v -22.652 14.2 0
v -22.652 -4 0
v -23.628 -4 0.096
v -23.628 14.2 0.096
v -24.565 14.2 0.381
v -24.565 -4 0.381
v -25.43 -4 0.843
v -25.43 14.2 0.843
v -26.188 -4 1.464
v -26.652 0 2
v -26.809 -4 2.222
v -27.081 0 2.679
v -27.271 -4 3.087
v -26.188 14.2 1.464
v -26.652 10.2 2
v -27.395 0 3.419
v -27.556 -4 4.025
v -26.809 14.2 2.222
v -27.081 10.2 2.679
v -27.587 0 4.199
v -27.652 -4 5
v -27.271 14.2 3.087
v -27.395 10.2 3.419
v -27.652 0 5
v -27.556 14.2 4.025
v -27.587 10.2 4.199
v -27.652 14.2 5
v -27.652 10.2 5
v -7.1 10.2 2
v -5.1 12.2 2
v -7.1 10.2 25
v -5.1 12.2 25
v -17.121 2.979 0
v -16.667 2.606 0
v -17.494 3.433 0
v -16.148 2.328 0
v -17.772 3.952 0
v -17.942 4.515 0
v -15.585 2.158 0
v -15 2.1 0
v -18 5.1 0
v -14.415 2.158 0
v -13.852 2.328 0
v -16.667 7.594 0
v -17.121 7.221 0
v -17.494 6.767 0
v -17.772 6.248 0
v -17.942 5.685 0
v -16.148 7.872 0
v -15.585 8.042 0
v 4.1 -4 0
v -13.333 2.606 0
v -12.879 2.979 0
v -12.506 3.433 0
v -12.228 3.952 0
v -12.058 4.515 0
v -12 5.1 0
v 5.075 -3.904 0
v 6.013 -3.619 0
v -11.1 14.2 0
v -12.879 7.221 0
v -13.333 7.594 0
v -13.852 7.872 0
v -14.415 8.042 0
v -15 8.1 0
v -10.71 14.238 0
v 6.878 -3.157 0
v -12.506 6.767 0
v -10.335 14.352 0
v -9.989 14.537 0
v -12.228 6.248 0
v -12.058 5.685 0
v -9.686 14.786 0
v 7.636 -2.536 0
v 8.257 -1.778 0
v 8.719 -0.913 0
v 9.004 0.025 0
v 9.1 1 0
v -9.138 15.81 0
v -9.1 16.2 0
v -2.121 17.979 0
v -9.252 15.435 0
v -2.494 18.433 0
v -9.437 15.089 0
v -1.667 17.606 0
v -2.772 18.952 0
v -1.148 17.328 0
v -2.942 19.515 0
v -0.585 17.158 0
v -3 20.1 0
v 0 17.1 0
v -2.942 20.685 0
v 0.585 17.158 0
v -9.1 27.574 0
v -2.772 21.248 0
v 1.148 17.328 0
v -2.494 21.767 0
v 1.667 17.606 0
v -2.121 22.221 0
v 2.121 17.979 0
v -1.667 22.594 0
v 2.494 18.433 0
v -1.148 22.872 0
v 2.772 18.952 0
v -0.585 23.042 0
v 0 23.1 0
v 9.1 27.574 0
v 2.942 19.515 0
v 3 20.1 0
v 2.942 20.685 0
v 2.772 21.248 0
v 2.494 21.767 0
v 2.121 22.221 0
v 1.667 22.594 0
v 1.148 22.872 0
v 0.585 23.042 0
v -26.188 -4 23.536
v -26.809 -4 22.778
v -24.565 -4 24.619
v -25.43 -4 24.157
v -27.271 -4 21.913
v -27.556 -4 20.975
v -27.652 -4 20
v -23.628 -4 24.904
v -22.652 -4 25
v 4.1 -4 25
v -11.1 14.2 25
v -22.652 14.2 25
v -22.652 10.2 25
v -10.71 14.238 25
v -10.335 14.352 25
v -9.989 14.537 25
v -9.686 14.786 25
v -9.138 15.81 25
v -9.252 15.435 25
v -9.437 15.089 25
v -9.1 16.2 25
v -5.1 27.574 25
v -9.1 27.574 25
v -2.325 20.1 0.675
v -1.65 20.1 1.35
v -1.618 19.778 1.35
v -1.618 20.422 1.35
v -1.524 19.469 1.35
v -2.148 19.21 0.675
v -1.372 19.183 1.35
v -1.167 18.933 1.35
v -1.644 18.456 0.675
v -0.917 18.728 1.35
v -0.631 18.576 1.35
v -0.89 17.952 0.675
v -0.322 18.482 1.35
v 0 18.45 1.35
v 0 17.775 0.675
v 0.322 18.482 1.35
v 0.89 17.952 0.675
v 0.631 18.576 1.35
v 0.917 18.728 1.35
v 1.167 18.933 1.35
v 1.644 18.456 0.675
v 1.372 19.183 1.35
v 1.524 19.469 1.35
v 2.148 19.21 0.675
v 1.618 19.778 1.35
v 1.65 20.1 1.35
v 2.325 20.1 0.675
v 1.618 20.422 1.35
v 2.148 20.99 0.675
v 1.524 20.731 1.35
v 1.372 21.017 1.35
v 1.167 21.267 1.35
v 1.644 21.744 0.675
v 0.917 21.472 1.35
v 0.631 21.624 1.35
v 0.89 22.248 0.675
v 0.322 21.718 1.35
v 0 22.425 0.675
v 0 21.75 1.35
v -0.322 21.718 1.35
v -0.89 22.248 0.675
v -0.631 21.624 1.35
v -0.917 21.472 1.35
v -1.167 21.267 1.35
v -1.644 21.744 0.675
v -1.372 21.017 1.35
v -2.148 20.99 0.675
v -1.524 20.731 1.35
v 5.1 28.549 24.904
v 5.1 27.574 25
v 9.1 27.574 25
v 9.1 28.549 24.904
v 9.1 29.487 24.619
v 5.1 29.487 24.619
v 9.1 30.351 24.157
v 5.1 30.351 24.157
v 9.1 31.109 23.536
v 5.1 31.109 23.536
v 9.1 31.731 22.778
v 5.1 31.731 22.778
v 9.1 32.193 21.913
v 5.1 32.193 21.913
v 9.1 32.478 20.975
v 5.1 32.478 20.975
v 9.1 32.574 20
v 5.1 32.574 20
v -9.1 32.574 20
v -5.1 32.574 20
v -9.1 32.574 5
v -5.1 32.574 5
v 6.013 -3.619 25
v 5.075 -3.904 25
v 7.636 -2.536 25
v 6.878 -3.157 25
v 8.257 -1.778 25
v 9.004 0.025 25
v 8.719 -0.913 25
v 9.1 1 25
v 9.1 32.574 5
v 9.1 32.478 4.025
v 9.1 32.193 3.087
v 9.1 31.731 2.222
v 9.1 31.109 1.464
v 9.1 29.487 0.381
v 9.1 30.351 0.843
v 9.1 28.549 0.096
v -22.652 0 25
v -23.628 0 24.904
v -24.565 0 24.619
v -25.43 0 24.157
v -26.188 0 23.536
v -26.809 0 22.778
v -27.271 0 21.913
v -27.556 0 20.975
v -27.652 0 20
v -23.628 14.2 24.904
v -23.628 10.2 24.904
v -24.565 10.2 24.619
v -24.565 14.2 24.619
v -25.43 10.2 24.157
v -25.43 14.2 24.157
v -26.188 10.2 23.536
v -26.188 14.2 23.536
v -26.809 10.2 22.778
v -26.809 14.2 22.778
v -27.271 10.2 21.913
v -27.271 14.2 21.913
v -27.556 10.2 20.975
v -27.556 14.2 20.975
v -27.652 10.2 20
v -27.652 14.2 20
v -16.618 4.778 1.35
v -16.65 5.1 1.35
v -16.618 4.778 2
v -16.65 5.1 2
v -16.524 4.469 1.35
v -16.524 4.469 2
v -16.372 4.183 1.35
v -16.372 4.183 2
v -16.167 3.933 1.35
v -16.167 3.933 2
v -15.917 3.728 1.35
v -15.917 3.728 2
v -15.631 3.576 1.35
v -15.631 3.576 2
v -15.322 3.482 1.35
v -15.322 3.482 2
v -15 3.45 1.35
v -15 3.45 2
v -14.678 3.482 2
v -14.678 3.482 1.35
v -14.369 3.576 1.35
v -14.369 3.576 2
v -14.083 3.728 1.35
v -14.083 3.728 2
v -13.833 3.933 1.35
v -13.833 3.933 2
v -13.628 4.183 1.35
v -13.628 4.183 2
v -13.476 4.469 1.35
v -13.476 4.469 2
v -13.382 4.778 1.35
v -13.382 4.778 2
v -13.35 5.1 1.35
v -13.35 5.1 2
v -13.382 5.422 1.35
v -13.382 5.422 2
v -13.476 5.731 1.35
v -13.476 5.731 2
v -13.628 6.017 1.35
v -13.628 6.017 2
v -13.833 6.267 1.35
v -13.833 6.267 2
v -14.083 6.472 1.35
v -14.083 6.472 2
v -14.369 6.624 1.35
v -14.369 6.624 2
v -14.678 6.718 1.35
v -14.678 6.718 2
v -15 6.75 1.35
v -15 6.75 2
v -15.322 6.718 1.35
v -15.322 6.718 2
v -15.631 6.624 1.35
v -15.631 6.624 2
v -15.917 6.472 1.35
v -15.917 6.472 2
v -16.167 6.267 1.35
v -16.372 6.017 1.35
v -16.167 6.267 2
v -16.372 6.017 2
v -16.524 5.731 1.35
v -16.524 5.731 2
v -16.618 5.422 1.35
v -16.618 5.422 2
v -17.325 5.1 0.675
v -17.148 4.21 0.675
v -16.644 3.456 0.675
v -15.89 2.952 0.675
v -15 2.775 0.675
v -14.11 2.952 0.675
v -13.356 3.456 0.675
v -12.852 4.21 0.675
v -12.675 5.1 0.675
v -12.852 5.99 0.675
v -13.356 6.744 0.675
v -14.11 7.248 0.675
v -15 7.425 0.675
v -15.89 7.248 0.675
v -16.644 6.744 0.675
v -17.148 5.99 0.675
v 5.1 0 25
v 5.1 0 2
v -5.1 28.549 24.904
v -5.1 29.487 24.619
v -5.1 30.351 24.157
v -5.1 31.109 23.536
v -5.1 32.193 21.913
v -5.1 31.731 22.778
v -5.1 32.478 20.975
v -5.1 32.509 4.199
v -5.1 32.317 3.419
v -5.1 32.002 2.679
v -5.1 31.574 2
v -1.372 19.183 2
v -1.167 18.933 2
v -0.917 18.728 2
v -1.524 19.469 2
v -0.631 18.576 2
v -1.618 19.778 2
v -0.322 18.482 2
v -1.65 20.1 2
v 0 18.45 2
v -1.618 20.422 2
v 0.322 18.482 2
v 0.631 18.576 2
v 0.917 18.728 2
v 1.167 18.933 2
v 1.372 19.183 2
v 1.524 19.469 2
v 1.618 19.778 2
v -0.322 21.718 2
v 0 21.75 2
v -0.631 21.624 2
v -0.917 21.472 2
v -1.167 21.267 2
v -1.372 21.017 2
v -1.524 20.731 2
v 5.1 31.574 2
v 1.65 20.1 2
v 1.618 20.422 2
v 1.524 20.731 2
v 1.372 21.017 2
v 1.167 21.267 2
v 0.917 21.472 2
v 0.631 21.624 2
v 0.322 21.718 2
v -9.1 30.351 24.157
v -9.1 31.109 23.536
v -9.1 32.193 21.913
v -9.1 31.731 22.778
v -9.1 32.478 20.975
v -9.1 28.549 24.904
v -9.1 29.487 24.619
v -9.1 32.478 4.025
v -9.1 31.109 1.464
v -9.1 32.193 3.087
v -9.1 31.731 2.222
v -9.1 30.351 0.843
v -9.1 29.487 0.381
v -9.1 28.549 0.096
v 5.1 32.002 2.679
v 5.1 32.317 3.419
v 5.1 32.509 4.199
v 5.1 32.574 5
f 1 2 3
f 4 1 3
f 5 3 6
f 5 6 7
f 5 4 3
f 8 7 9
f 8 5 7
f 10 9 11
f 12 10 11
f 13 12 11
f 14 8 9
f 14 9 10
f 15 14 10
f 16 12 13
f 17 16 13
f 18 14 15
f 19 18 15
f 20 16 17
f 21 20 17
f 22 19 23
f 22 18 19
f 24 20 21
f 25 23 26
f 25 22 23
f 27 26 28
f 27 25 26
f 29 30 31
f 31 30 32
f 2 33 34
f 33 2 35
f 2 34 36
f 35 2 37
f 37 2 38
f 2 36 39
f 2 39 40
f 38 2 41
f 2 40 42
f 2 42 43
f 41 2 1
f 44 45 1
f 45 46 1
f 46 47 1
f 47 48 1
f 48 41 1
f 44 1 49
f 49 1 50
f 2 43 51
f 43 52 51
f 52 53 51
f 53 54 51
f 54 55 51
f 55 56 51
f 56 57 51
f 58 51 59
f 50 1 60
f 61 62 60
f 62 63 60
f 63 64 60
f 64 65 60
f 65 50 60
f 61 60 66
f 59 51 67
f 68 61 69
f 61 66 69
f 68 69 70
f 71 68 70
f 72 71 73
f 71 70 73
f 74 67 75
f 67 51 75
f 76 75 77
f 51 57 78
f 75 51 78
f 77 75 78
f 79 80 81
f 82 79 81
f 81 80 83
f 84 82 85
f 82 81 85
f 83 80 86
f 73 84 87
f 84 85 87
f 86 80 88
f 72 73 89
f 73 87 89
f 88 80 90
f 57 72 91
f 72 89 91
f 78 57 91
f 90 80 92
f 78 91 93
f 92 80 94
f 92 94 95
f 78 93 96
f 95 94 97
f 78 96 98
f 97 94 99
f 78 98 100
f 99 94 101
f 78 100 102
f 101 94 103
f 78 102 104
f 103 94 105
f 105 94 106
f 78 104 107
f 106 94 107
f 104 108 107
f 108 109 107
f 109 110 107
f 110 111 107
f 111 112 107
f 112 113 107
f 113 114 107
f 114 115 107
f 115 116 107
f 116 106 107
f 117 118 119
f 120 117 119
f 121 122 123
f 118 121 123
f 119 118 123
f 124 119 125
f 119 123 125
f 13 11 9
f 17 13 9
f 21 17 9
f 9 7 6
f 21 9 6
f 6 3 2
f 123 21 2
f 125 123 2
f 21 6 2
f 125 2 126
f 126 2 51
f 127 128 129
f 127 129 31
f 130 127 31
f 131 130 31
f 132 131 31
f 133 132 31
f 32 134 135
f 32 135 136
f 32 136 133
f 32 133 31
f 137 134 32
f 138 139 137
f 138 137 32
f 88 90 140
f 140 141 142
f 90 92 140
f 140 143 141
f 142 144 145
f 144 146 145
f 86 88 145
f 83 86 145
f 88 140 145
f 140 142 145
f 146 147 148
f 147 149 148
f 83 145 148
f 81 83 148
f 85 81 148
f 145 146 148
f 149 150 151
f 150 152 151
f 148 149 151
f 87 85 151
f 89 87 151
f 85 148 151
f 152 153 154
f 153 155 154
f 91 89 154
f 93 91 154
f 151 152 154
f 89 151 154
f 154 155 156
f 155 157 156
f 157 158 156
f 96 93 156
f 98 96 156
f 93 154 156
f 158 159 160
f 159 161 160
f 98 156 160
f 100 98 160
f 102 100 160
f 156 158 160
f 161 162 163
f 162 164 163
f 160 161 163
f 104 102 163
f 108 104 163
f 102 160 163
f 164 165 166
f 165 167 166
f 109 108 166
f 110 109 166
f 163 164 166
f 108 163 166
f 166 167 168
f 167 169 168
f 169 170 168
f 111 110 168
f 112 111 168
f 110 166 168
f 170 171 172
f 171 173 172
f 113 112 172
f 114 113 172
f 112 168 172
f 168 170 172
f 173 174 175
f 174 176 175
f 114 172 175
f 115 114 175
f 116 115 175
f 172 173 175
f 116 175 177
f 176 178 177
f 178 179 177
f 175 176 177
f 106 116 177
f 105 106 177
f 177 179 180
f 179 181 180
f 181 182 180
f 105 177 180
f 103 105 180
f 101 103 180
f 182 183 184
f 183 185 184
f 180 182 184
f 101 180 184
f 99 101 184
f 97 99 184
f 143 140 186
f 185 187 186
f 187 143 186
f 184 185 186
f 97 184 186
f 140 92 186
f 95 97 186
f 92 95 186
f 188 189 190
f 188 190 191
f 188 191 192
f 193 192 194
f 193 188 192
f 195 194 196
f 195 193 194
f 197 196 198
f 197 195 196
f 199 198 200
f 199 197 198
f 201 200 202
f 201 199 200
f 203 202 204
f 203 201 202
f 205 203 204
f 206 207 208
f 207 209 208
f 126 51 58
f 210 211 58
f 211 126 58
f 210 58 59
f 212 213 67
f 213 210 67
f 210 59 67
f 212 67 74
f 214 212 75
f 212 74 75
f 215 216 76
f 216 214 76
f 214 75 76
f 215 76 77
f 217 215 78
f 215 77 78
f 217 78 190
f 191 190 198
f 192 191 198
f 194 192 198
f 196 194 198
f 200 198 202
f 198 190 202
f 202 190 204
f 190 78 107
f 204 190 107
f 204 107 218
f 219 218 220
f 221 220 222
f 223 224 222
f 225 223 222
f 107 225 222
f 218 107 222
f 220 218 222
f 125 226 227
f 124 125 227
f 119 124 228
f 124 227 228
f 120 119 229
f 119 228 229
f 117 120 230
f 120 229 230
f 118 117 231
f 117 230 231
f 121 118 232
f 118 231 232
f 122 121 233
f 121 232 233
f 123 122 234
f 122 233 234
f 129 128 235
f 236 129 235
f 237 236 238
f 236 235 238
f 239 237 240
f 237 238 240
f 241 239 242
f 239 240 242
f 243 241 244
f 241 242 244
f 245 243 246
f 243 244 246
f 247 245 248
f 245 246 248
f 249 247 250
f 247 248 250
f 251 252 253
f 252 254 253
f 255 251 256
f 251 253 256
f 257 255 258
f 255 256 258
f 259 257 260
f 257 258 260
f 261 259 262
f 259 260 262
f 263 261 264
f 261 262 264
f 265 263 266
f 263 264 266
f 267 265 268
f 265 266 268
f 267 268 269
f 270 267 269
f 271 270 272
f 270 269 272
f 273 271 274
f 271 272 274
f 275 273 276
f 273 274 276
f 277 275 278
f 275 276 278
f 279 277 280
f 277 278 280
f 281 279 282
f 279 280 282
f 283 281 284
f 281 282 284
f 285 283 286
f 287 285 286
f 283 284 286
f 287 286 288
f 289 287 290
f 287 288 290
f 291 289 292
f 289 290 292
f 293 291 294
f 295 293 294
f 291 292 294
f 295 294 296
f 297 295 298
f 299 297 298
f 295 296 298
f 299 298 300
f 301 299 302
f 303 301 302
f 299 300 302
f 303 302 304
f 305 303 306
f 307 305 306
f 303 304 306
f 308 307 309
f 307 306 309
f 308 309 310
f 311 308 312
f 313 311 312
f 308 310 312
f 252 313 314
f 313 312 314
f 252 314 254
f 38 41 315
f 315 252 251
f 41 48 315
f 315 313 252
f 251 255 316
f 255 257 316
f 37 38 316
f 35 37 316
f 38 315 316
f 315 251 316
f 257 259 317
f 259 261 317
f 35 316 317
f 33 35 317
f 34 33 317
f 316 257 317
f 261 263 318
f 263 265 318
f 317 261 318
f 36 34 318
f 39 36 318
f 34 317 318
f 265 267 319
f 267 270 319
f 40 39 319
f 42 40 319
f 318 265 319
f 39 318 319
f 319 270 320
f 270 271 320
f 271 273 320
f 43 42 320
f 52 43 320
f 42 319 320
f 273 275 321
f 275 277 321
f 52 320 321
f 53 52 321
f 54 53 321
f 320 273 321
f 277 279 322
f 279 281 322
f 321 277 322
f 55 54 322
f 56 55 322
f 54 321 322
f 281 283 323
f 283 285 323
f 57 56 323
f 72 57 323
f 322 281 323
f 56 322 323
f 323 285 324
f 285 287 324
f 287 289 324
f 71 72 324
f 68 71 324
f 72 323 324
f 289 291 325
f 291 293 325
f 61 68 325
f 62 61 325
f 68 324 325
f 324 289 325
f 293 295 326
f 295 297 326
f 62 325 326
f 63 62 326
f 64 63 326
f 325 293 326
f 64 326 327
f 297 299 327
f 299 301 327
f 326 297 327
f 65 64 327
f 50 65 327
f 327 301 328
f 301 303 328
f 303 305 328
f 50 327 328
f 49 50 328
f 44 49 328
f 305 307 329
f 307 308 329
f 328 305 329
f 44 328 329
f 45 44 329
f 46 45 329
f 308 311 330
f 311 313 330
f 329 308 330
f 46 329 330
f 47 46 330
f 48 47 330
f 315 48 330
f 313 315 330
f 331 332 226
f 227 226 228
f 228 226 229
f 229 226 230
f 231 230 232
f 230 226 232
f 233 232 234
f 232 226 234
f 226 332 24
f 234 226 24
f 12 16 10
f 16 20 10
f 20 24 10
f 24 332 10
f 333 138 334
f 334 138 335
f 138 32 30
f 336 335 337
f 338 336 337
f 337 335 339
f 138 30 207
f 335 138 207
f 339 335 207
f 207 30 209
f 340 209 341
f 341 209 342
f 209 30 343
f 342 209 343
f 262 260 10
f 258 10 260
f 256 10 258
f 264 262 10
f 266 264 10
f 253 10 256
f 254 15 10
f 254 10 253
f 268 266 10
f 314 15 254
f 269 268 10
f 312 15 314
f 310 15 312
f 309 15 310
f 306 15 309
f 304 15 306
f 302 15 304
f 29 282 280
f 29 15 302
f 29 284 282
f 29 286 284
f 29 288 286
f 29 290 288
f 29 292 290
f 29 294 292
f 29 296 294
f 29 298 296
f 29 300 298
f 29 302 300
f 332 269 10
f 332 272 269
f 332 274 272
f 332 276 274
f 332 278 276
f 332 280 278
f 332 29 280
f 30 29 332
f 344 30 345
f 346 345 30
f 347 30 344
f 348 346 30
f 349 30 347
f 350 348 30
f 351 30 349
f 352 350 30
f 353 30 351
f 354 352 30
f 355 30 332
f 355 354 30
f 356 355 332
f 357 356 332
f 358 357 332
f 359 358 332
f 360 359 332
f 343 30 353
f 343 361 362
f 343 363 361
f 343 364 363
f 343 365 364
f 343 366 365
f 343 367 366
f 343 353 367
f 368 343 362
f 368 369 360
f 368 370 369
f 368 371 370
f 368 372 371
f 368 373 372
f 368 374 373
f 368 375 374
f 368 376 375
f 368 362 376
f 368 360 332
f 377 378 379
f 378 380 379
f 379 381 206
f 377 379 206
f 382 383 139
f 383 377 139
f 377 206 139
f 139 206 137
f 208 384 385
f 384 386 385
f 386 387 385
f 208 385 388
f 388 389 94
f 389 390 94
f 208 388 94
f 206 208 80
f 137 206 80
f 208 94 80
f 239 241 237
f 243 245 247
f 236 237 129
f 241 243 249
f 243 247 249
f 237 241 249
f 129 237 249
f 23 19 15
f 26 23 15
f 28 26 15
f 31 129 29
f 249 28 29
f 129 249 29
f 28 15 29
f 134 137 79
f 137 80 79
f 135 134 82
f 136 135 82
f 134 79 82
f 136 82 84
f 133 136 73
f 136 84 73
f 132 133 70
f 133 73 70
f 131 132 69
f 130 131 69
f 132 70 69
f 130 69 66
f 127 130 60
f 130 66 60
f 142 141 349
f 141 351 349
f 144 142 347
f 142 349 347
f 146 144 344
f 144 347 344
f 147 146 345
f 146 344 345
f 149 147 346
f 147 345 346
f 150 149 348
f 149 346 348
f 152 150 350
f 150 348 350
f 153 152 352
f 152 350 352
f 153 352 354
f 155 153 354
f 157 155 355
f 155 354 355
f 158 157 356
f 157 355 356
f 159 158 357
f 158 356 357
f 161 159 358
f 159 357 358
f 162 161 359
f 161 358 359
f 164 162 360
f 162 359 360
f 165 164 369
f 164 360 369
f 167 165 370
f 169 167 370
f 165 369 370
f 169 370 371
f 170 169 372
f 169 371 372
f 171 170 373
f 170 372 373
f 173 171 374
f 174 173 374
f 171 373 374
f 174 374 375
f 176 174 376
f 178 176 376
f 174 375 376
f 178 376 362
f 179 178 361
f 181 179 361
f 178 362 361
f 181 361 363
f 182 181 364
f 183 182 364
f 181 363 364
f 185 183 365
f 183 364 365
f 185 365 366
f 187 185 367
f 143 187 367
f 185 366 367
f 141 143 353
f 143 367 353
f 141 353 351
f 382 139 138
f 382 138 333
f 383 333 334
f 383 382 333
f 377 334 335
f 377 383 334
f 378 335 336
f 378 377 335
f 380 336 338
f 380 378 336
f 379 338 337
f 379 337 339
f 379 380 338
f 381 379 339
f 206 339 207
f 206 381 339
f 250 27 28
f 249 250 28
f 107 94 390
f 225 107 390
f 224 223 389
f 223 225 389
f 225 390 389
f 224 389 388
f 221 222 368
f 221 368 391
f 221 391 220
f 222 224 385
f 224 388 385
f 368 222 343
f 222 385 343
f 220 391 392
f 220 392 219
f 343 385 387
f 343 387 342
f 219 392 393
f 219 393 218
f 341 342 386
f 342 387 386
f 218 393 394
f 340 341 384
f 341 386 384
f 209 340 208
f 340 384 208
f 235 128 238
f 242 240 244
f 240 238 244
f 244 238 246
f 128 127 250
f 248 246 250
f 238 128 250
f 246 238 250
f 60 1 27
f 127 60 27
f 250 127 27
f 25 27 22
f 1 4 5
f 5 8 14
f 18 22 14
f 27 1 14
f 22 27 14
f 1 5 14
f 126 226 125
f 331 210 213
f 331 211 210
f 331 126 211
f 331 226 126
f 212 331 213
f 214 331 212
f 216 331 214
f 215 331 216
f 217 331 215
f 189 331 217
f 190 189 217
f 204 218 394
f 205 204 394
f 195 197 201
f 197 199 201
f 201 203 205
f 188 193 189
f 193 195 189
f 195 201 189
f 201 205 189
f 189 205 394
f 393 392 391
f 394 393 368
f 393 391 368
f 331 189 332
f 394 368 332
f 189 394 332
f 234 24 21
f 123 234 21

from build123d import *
from build123d import SkipClean  # not in build123d's __all__

# Parameters (mm, degrees)
F1_DEPTH       = 2
F2_DEPTH       = 25
F3_T1_DEPTH    = 29
F3_T3_DEPTH    = 29
F3_T5_DEPTH    = 29
F3_T7_DEPTH    = 29
F3_T9_DEPTH    = 43.2
F3_T11_DEPTH   = 43.2
F3_T13_DEPTH   = 50
F4_R           = 2
F5_SIZE        = 2
F7_D           = 3.3
F7_CSINK_D     = 6
F7_CSINK_ANGLE = 90


# Not quite as in the source:
# - a fillet or chamfer that OpenCascade refuses, or shapes differently, is made with other operations: its cross-section is extruded or revolved along the edge and cut away or added
# - a feature names something its author has since deleted; it is built from what else it names


with BuildPart() as f1:
    # F0 (on Top) → F1 (new body)
    with BuildSketch(Plane.XY):
        Polygon((5.1, 0), (5.1, 10.2), (5.1, 32.5735770881), (-5.1, 32.5735770881), (-5.1, 10.2), (-27.6520505063, 10.2), (-27.6520505063, 0), (0, 0), align=None)
        Polygon((5.1, 32.5735770881), (5.1, 10.2), (5.1, 0), (0, 0), (-27.6520505063, 0), (-27.6520505063, -4), (0, -4), (9.1, -4), (9.1, 32.5735770881), align=None)
        Polygon((-5.1, 10.2), (-5.1, 32.5735770881), (-9.1, 32.5735770881), (-9.1, 14.2), (-27.6520505063, 14.2), (-27.6520505063, 10.2), align=None)
    extrude(amount=F1_DEPTH)

    # F0 (on Top) → F2 (join)
    with BuildSketch(Plane.XY):
        Polygon((-5.1, 10.2), (-5.1, 32.5735770881), (-9.1, 32.5735770881), (-9.1, 14.2), (-27.6520505063, 14.2), (-27.6520505063, 10.2), align=None)
        Polygon((5.1, 32.5735770881), (5.1, 10.2), (5.1, 0), (0, 0), (-27.6520505063, 0), (-27.6520505063, -4), (0, -4), (9.1, -4), (9.1, 32.5735770881), align=None)
    extrude(amount=F2_DEPTH)

    # F3: fillet of radius 5 on 7 edges, made by hand

    # F3_s2 → F3_t1 (cut)
    with BuildSketch(Plane.XZ.offset(-12.5)):
        with BuildLine():
            ThreePointArc((-22.6520505063, 25), (-26.1875844123, 23.5355339059), (-27.6520505063, 20))
            Line((-27.6520505063, 20), (-27.6520505063, 25))
            Line((-27.6520505063, 25), (-22.6520505063, 25))
        make_face()
    extrude(amount=F3_T1_DEPTH, mode=Mode.SUBTRACT)

    # F3_s4 → F3_t3 (cut)
    with BuildSketch(Plane.XZ.offset(-26.7)):
        with BuildLine():
            ThreePointArc((-22.6520505063, 25), (-26.1875844123, 23.5355339059), (-27.6520505063, 20))
            Line((-27.6520505063, 20), (-27.6520505063, 25))
            Line((-27.6520505063, 25), (-22.6520505063, 25))
        make_face()
    extrude(amount=F3_T3_DEPTH, mode=Mode.SUBTRACT)

    # F3_s6 → F3_t5 (cut)
    with BuildSketch(Plane.YZ.offset(-21.6)):
        with BuildLine():
            ThreePointArc((27.5735770881, 25), (31.1091109941, 23.5355339059), (32.5735770881, 20))
            Line((32.5735770881, 20), (32.5735770881, 25))
            Line((32.5735770881, 25), (27.5735770881, 25))
        make_face()
    extrude(amount=F3_T5_DEPTH, mode=Mode.SUBTRACT)

    # F3_s8 → F3_t7 (cut)
    with BuildSketch(Plane.YZ.offset(-7.4)):
        with BuildLine():
            ThreePointArc((32.5735770881, 20), (31.1091109941, 23.5355339059), (27.5735770881, 25))
            Line((27.5735770881, 25), (32.5735770881, 25))
            Line((32.5735770881, 25), (32.5735770881, 20))
        make_face()
    with SkipClean():  # cleaning this boolean's faces spoils the solid; the shape is the same uncleaned
        extrude(amount=F3_T7_DEPTH, mode=Mode.SUBTRACT)

    # F3_s10 → F3_t9 (cut)
    with BuildSketch(Plane.XZ.offset(-26.7)):
        with BuildLine():
            ThreePointArc((-22.6520505063, 0), (-26.1875844123, 1.4644660941), (-27.6520505063, 5))
            Line((-27.6520505063, 5), (-27.6520505063, 0))
            Line((-27.6520505063, 0), (-22.6520505063, 0))
        make_face()
    extrude(amount=F3_T9_DEPTH, mode=Mode.SUBTRACT)

    # F3_s12 → F3_t11 (cut)
    with BuildSketch(Plane.YZ.offset(-21.6)):
        with BuildLine():
            ThreePointArc((27.5735770881, 0), (31.1091109941, 1.4644660941), (32.5735770881, 5))
            Line((32.5735770881, 5), (32.5735770881, 0))
            Line((32.5735770881, 0), (27.5735770881, 0))
        make_face()
    extrude(amount=F3_T11_DEPTH, mode=Mode.SUBTRACT)

    # F3_s14 → F3_t13 (cut)
    with BuildSketch(Plane.XY.offset(-12.5)):
        with BuildLine():
            ThreePointArc((4.1, -4), (7.6355339059, -2.5355339059), (9.1, 1))
            Line((9.1, 1), (9.1, -4))
            Line((9.1, -4), (4.1, -4))
        make_face()
    extrude(amount=F3_T13_DEPTH, mode=Mode.SUBTRACT)

    # F4
    f4_edges = [f1.edges().sort_by_distance(p)[0] for p in [
        (-9.1, 14.2, 12.5),
    ]]
    fillet(f4_edges, radius=F4_R)

    # F5
    f5_edges = [f1.edges().sort_by_distance(p)[0] for p in [
        (-5.1, 10.2, 13.5),
    ]]
    chamfer(f5_edges, length=F5_SIZE)

    # F7 (through all)
    with Locations(Plane(origin=(0, 0, 0), x_dir=(1, 0, 0), z_dir=(0, 0, -1))):
        with Locations((-15, -5.1), (0, -20.1)):
            CounterSinkHole(F7_D / 2, F7_CSINK_D / 2, counter_sink_angle=F7_CSINK_ANGLE)


solid = f1.part
